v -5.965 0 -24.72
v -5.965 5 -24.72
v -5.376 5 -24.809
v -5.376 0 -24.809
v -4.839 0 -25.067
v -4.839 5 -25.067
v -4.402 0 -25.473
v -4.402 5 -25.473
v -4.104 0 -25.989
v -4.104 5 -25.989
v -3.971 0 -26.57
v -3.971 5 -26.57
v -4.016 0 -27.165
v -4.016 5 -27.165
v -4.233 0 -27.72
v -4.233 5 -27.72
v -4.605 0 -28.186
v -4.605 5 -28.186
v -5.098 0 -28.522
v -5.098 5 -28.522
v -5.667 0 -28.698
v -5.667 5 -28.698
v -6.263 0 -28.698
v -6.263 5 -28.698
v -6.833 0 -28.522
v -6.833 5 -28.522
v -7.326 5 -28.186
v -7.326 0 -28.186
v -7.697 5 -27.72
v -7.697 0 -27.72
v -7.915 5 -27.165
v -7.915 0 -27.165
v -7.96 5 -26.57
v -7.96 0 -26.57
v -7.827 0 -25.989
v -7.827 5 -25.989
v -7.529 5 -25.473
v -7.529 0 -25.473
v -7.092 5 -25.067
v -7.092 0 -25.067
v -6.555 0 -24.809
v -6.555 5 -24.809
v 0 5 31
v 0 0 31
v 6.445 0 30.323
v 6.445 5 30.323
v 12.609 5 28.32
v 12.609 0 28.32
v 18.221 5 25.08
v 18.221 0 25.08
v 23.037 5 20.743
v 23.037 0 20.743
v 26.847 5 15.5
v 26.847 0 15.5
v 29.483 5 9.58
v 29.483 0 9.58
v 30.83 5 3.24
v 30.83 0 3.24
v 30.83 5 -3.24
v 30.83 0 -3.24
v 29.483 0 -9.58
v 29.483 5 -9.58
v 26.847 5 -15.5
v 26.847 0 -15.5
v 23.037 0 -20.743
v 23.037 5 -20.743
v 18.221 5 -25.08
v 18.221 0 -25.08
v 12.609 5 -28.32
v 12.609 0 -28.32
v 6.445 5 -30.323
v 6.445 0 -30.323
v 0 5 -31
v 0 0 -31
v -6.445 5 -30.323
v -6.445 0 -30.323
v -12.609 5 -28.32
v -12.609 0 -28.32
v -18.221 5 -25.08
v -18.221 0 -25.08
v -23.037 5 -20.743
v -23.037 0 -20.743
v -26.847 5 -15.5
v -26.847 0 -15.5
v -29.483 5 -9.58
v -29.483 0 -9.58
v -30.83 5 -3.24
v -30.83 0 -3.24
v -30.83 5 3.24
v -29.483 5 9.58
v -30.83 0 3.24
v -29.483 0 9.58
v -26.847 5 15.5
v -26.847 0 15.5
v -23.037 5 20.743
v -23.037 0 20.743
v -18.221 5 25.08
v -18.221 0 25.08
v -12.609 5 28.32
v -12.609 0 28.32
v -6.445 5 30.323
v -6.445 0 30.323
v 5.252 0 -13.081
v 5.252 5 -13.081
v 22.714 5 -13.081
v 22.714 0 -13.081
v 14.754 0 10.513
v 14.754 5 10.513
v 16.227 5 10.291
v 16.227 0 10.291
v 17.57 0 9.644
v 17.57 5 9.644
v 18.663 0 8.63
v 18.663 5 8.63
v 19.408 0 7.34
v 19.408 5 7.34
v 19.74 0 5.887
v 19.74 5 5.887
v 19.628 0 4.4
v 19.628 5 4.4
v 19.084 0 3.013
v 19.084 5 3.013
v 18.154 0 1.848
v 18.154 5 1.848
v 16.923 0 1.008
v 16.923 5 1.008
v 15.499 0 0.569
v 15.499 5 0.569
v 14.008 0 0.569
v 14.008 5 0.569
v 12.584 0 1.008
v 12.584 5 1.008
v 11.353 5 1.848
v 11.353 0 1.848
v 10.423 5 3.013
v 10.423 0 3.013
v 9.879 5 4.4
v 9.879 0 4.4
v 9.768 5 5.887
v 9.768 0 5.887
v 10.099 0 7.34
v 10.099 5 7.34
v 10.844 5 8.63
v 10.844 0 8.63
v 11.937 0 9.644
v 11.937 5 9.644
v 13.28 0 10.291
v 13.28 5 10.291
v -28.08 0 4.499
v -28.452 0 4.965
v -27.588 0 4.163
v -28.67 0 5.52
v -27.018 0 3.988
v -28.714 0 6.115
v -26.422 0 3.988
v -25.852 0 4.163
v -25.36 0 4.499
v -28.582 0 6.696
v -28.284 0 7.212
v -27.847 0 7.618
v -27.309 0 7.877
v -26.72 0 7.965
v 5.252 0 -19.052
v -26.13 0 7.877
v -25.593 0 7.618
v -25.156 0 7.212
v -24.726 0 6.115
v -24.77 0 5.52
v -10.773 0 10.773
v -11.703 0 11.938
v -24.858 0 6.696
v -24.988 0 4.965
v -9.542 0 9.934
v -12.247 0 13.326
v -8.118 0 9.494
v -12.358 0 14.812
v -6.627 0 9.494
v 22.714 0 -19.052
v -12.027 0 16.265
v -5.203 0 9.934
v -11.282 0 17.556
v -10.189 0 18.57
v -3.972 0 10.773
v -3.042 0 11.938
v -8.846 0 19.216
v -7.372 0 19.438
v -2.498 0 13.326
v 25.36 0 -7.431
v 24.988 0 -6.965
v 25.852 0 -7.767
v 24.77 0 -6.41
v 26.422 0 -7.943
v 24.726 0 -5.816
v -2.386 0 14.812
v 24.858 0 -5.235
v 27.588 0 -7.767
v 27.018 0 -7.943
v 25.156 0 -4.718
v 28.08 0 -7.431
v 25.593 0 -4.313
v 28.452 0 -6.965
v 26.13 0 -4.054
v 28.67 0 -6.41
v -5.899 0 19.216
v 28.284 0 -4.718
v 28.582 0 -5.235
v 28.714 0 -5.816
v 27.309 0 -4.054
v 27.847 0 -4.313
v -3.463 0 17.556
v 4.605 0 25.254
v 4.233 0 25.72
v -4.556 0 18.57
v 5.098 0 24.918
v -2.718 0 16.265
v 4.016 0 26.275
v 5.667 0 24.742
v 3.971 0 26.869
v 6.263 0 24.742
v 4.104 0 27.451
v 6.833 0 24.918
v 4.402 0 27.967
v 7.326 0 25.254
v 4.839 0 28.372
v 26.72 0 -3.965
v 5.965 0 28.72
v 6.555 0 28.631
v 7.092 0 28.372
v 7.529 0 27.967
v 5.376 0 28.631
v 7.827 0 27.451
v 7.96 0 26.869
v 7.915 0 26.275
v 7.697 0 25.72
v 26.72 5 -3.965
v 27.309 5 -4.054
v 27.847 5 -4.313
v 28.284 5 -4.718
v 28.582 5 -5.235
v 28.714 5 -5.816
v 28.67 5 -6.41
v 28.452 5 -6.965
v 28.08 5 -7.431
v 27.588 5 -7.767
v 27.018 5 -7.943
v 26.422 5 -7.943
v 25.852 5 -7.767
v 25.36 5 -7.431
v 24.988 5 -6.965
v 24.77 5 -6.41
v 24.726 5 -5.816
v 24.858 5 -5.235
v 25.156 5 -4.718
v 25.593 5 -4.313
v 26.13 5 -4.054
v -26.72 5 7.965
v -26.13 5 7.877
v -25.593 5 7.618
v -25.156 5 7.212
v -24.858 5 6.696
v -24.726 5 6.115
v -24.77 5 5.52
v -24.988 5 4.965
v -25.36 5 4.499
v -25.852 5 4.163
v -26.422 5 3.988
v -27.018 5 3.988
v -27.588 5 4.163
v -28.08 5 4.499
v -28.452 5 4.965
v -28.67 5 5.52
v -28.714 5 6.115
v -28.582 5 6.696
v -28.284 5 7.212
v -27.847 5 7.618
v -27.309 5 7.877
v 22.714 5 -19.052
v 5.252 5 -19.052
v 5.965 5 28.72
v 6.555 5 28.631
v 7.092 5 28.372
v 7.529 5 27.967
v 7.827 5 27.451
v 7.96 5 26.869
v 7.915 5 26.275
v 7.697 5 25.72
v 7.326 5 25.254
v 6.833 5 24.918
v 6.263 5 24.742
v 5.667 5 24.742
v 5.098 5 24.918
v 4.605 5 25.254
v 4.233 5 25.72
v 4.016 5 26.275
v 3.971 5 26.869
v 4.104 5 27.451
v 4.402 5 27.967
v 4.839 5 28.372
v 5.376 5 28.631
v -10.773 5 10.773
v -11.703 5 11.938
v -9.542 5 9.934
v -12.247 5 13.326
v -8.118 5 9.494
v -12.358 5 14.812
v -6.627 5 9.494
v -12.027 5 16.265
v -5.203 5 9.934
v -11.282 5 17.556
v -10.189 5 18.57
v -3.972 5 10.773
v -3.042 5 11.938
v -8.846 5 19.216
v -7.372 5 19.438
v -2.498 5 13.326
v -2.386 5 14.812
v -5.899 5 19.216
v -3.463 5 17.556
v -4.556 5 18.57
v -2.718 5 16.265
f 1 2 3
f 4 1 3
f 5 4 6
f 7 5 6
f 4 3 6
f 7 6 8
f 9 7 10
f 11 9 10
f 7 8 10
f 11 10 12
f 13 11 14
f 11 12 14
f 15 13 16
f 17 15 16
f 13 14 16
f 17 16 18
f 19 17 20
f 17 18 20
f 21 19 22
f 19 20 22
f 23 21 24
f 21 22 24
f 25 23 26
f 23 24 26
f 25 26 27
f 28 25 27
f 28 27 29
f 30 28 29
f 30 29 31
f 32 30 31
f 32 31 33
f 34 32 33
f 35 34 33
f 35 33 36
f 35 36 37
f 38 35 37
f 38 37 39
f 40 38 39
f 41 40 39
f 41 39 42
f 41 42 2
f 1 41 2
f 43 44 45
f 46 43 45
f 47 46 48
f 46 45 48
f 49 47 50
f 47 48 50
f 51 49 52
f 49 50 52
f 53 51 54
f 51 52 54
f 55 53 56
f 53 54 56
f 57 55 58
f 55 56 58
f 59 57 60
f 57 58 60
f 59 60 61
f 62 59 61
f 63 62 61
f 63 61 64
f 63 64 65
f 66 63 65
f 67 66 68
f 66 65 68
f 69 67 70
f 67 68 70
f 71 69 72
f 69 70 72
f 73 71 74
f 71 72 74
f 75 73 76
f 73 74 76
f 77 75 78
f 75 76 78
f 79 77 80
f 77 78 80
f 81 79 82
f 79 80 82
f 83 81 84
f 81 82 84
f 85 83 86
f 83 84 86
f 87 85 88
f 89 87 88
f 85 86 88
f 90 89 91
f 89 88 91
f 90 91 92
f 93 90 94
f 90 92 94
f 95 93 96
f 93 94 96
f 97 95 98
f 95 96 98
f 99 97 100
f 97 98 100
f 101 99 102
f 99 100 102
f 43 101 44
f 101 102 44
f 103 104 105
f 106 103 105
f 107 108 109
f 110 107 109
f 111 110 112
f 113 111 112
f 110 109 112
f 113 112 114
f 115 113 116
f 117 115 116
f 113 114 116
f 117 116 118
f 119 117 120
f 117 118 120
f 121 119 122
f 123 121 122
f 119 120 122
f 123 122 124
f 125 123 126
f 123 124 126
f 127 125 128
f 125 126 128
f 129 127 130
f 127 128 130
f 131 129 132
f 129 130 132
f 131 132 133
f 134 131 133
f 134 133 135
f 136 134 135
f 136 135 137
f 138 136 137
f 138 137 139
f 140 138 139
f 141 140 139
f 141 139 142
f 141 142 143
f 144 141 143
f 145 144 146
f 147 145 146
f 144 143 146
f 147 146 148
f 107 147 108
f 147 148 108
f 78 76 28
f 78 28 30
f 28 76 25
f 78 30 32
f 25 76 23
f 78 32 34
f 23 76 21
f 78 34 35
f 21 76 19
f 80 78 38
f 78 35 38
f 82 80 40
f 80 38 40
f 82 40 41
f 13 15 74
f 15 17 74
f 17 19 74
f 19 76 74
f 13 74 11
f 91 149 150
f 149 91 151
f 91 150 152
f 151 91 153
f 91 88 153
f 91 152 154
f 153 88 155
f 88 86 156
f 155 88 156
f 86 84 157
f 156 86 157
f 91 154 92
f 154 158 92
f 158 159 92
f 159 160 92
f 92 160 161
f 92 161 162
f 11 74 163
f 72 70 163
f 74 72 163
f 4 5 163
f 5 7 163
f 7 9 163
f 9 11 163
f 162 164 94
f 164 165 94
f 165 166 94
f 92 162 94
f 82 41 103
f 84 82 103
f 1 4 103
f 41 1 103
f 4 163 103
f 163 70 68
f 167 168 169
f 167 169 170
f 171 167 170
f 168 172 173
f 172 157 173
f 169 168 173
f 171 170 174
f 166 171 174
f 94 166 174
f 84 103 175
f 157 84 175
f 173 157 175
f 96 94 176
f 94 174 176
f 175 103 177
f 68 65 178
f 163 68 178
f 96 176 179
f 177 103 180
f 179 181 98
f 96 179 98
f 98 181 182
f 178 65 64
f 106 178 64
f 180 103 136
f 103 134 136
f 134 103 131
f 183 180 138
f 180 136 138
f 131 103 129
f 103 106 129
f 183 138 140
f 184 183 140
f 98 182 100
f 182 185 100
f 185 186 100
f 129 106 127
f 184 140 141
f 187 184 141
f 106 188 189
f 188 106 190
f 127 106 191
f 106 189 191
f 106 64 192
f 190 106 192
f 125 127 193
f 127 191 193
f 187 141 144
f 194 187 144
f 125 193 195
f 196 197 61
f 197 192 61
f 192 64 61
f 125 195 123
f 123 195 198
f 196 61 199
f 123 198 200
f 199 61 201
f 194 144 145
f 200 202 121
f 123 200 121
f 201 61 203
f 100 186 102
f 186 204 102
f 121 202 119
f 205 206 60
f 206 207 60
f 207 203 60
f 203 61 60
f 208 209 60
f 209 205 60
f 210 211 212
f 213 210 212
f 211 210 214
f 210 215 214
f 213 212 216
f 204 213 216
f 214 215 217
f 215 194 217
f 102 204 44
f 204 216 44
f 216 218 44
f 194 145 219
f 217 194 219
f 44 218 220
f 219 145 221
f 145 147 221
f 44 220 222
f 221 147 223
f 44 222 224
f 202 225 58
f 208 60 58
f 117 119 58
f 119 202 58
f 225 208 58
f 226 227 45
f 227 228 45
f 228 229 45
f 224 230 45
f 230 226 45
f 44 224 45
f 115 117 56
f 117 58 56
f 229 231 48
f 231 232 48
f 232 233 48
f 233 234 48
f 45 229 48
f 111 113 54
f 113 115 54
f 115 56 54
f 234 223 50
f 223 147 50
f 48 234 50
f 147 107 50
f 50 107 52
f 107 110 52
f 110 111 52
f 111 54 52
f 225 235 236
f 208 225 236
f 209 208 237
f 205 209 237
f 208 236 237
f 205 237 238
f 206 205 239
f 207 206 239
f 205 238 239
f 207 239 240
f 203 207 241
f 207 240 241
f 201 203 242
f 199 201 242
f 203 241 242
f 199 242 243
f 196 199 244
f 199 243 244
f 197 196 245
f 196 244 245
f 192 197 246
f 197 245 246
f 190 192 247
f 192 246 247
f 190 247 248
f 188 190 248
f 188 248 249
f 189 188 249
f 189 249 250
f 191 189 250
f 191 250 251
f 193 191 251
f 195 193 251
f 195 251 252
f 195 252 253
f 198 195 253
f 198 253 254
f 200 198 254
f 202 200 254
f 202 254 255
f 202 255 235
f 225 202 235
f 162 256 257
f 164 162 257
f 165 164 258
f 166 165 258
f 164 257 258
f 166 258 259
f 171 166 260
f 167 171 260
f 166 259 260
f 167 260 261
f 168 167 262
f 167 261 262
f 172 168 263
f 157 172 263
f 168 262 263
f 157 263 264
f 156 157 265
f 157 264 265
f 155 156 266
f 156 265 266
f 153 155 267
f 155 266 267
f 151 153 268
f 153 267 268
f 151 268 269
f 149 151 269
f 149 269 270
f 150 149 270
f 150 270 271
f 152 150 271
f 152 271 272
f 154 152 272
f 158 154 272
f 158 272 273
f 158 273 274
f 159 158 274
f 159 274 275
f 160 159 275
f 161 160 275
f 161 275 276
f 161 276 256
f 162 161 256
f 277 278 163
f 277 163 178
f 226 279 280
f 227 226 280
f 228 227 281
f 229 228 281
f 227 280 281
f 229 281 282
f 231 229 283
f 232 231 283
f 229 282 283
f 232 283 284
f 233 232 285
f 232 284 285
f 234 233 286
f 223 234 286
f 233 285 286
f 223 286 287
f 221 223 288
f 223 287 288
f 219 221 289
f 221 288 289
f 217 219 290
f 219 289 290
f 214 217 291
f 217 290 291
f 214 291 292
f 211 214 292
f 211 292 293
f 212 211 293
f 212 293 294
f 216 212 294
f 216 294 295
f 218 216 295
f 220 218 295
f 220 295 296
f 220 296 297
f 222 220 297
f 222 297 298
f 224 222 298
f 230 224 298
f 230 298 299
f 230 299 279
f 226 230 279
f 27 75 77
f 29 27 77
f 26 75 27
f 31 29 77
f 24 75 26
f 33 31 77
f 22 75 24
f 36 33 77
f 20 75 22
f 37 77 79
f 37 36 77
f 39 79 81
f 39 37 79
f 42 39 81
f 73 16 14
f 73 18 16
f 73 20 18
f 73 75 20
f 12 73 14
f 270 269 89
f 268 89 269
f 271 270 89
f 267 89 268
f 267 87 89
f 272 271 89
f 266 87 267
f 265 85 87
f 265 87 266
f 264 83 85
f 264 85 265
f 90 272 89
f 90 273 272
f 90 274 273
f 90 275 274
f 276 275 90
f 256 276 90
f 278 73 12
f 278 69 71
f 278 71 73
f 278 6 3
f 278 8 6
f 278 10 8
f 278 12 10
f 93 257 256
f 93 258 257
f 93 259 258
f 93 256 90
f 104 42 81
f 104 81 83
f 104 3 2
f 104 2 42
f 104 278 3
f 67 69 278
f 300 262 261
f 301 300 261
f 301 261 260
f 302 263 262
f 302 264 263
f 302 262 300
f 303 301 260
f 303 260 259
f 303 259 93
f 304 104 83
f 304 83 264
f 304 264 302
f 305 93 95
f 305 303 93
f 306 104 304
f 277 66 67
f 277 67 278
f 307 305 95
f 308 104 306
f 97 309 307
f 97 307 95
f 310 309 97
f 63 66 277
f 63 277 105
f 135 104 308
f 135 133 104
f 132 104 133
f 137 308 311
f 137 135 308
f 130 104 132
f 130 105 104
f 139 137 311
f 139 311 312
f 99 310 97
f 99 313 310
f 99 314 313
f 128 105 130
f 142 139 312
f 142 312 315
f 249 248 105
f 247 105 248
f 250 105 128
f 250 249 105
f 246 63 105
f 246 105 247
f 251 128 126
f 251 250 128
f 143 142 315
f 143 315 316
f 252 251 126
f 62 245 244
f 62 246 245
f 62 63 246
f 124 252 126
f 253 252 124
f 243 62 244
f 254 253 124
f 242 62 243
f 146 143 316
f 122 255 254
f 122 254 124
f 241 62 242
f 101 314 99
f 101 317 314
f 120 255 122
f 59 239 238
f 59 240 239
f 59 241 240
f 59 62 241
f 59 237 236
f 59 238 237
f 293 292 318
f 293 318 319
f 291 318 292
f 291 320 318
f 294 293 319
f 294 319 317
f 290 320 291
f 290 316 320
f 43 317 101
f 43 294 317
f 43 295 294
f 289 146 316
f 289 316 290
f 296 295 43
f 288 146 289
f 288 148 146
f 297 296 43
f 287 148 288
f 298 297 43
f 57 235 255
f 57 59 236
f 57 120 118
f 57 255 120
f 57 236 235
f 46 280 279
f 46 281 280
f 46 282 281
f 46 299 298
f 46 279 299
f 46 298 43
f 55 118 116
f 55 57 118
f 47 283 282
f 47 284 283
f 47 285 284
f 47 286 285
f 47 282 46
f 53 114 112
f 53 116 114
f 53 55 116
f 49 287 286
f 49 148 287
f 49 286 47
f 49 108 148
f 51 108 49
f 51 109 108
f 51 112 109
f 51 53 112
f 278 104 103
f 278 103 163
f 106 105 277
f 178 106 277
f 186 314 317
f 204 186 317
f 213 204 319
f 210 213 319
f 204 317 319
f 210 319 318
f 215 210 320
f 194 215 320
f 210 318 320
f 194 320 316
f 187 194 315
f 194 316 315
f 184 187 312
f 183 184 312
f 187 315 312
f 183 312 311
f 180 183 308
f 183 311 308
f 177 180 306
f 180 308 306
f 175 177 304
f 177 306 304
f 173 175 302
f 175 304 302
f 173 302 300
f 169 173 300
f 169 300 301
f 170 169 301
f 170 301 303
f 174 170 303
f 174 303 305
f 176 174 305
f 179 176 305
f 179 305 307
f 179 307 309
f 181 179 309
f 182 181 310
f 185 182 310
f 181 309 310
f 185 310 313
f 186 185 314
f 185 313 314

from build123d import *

# Parameters (mm, degrees)
SKETCH1_R           = 31
BOSS_EXTRUDE1_DEPTH = 5
SKETCH2_R           = 2
CUT_EXTRUDE1_DEPTH  = 12.5
SKETCH5_W           = 17.462022727
SKETCH5_H           = 5.971364383
CUT_EXTRUDE3_DEPTH  = 5
SKETCH6_R           = 5
CUT_EXTRUDE4_DEPTH  = 5


with BuildPart() as part:
    # Sketch1 → Boss-Extrude1 (new body)
    with BuildSketch(Plane(origin=(0, 0, 0), x_dir=(1, 0, 0), z_dir=(0, 1, 0))):
        with Locations(Location((0, 0, 0), (0, 0, 270))):
            Circle(SKETCH1_R)
    extrude(amount=BOSS_EXTRUDE1_DEPTH)

    # Sketch2 → Cut-Extrude1 (cut)
    with BuildSketch(Plane(origin=(0, 5, 0), x_dir=(1, 0, 0), z_dir=(0, 1, 0))):
        with Locations(Location((-26.719955328, -5.965376271, 0), (0, 0, 270))):
            Circle(SKETCH2_R)
        with Locations(Location((-5.965376271, 26.719955328, 0), (0, 0, 270))):
            Circle(SKETCH2_R)
        with Locations(Location((26.719955328, 5.965376271, 0), (0, 0, 270))):
            Circle(SKETCH2_R)
        with Locations(Location((5.965376271, -26.719955328, 0), (0, 0, 270))):
            Circle(SKETCH2_R)
    extrude(amount=-CUT_EXTRUDE1_DEPTH, mode=Mode.SUBTRACT)

    # Sketch5 → Cut-Extrude3 (cut)
    with BuildSketch(Plane(origin=(0, 5, 0), x_dir=(1, 0, 0), z_dir=(0, 1, 0))):
        with Locations((13.983311231, 16.066566387)):
            Rectangle(SKETCH5_W, SKETCH5_H)
    extrude(amount=-CUT_EXTRUDE3_DEPTH, mode=Mode.SUBTRACT)

    # Sketch6 → Cut-Extrude4 (cut)
    with BuildSketch(Plane(origin=(0, 5, 0), x_dir=(1, 0, 0), z_dir=(0, 1, 0))):
        with Locations(Location((-7.372449441, -14.438403546, 0), (0, 0, 270))):
            Circle(SKETCH6_R)
        with Locations(Location((14.753523974, -5.51293548, 0), (0, 0, 270))):
            Circle(SKETCH6_R)
    extrude(amount=-CUT_EXTRUDE4_DEPTH, mode=Mode.SUBTRACT)


solid = part.part
